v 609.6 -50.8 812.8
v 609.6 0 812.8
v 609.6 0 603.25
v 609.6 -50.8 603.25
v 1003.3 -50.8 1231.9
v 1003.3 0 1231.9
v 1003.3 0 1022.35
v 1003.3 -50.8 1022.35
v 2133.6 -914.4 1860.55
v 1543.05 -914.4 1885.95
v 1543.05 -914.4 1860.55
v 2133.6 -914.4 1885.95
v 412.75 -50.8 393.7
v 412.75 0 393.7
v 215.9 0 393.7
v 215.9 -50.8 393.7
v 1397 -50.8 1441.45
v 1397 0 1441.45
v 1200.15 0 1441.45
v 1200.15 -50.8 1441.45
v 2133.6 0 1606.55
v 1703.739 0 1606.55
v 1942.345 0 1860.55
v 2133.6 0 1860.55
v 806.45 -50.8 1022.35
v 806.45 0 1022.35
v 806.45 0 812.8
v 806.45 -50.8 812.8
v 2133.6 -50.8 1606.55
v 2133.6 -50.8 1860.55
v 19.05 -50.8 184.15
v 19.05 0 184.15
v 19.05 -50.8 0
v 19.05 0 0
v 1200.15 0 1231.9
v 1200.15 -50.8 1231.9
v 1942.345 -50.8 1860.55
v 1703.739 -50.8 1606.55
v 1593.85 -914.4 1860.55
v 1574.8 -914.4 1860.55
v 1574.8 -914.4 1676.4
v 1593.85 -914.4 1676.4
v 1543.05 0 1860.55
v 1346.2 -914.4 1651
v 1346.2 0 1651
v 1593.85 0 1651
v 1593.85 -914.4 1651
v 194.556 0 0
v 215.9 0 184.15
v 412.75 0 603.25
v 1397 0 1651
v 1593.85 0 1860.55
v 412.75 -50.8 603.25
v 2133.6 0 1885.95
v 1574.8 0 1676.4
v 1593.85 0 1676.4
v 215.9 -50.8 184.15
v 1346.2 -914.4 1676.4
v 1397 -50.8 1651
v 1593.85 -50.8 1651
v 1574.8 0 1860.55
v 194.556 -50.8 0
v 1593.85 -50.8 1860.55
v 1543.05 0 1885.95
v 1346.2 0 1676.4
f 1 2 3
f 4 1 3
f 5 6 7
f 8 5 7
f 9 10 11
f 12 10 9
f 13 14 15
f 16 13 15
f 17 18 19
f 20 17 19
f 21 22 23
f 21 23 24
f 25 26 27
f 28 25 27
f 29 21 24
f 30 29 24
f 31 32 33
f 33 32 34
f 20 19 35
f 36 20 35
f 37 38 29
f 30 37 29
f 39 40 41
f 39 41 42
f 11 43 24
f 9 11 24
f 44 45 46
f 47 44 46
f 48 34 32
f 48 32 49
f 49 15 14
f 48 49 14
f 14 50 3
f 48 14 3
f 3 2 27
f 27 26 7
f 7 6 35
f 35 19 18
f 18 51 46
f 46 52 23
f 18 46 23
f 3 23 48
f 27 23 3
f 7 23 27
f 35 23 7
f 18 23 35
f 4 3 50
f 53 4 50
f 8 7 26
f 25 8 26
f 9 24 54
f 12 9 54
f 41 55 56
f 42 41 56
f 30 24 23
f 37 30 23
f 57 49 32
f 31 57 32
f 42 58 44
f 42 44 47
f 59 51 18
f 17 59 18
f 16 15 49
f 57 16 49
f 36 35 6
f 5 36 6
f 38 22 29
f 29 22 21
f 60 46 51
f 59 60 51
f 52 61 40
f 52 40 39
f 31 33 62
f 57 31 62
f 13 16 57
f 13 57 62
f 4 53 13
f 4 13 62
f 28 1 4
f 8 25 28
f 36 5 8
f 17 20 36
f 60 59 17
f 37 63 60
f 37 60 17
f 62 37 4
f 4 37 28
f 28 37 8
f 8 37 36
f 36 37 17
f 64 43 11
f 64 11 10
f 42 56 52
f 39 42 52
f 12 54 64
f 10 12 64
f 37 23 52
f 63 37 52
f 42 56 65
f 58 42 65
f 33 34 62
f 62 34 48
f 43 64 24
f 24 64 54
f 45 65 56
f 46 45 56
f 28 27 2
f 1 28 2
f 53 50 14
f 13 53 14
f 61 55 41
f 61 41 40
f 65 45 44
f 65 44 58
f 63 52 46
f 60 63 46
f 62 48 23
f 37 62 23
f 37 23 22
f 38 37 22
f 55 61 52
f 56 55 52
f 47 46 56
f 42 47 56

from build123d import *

# Parameters (mm, degrees)
F1_DEPTH = 50.8
F0_W     = 31.75
F0_H     = 25.4
F2_DEPTH = 914.4
F3_DEPTH = 914.4
F0_W_2   = 19.05
F0_H_2   = 184.15
F4_DEPTH = 914.4
F5_DEPTH = 50.8


with BuildPart() as f1:
    # F0 (on Front) → F1 (new body)
    with BuildSketch(Plane.XZ):
        Polygon((19.05, 184.15), (19.05, 0), (194.5557310738, 0), (1703.7390644071, 1606.55), (1942.3451250132, 1860.55), (1593.85, 1860.55), (1593.85, 1676.4), (1593.85, 1651), (1397, 1651), (1397, 1466.85), (1397, 1441.45), (1200.15, 1441.45), (1200.15, 1257.3), (1200.15, 1231.9), (1003.3, 1231.9), (1003.3, 1047.75), (1003.3, 1022.35), (806.45, 1022.35), (806.45, 838.2), (806.45, 812.8), (609.6, 812.8), (609.6, 628.65), (609.6, 603.25), (412.75, 603.25), (412.75, 419.1), (412.75, 393.7), (215.9, 393.7), (215.9, 209.55), (215.9, 184.15), align=None)
    extrude(amount=F1_DEPTH)


with BuildPart() as f2:
    # F0 (on Front) → F2 (new body)
    with BuildSketch(Plane.XZ):
        Polygon((1593.85, 1651), (1593.85, 1676.4), (1574.8, 1676.4), (1377.95, 1676.4), (1377.95, 1651), (1397, 1651), align=None)
        with Locations((1362.075, 1663.7)):
            Rectangle(F0_W, F0_H)
    extrude(amount=F2_DEPTH)


with BuildPart() as f3:
    # F0 (on Front) → F3 (new body)
    with BuildSketch(Plane.XZ):
        Polygon((1593.85, 1860.55), (1942.3451250132, 1860.55), (2133.6, 1860.55), (2133.6, 1885.95), (1574.8, 1885.95), (1574.8, 1860.55), align=None)
        with Locations((1558.925, 1873.25)):
            Rectangle(F0_W, F0_H)
    extrude(amount=F3_DEPTH)


with BuildPart() as f4:
    # F0 (on Front) → F4 (new body)
    with BuildSketch(Plane.XZ):
        with Locations((1584.325, 1768.475)):
            Rectangle(F0_W_2, F0_H_2)
    extrude(amount=F4_DEPTH)


with BuildPart() as f5:
    # F0 (on Front) → F5 (new body)
    with BuildSketch(Plane.XZ):
        Polygon((1942.3451250132, 1860.55), (1703.7390644071, 1606.55), (2133.6, 1606.55), (2133.6, 1860.55), align=None)
    extrude(amount=F5_DEPTH)


solid = Compound([f1.part, f2.part, f3.part, f4.part, f5.part])
